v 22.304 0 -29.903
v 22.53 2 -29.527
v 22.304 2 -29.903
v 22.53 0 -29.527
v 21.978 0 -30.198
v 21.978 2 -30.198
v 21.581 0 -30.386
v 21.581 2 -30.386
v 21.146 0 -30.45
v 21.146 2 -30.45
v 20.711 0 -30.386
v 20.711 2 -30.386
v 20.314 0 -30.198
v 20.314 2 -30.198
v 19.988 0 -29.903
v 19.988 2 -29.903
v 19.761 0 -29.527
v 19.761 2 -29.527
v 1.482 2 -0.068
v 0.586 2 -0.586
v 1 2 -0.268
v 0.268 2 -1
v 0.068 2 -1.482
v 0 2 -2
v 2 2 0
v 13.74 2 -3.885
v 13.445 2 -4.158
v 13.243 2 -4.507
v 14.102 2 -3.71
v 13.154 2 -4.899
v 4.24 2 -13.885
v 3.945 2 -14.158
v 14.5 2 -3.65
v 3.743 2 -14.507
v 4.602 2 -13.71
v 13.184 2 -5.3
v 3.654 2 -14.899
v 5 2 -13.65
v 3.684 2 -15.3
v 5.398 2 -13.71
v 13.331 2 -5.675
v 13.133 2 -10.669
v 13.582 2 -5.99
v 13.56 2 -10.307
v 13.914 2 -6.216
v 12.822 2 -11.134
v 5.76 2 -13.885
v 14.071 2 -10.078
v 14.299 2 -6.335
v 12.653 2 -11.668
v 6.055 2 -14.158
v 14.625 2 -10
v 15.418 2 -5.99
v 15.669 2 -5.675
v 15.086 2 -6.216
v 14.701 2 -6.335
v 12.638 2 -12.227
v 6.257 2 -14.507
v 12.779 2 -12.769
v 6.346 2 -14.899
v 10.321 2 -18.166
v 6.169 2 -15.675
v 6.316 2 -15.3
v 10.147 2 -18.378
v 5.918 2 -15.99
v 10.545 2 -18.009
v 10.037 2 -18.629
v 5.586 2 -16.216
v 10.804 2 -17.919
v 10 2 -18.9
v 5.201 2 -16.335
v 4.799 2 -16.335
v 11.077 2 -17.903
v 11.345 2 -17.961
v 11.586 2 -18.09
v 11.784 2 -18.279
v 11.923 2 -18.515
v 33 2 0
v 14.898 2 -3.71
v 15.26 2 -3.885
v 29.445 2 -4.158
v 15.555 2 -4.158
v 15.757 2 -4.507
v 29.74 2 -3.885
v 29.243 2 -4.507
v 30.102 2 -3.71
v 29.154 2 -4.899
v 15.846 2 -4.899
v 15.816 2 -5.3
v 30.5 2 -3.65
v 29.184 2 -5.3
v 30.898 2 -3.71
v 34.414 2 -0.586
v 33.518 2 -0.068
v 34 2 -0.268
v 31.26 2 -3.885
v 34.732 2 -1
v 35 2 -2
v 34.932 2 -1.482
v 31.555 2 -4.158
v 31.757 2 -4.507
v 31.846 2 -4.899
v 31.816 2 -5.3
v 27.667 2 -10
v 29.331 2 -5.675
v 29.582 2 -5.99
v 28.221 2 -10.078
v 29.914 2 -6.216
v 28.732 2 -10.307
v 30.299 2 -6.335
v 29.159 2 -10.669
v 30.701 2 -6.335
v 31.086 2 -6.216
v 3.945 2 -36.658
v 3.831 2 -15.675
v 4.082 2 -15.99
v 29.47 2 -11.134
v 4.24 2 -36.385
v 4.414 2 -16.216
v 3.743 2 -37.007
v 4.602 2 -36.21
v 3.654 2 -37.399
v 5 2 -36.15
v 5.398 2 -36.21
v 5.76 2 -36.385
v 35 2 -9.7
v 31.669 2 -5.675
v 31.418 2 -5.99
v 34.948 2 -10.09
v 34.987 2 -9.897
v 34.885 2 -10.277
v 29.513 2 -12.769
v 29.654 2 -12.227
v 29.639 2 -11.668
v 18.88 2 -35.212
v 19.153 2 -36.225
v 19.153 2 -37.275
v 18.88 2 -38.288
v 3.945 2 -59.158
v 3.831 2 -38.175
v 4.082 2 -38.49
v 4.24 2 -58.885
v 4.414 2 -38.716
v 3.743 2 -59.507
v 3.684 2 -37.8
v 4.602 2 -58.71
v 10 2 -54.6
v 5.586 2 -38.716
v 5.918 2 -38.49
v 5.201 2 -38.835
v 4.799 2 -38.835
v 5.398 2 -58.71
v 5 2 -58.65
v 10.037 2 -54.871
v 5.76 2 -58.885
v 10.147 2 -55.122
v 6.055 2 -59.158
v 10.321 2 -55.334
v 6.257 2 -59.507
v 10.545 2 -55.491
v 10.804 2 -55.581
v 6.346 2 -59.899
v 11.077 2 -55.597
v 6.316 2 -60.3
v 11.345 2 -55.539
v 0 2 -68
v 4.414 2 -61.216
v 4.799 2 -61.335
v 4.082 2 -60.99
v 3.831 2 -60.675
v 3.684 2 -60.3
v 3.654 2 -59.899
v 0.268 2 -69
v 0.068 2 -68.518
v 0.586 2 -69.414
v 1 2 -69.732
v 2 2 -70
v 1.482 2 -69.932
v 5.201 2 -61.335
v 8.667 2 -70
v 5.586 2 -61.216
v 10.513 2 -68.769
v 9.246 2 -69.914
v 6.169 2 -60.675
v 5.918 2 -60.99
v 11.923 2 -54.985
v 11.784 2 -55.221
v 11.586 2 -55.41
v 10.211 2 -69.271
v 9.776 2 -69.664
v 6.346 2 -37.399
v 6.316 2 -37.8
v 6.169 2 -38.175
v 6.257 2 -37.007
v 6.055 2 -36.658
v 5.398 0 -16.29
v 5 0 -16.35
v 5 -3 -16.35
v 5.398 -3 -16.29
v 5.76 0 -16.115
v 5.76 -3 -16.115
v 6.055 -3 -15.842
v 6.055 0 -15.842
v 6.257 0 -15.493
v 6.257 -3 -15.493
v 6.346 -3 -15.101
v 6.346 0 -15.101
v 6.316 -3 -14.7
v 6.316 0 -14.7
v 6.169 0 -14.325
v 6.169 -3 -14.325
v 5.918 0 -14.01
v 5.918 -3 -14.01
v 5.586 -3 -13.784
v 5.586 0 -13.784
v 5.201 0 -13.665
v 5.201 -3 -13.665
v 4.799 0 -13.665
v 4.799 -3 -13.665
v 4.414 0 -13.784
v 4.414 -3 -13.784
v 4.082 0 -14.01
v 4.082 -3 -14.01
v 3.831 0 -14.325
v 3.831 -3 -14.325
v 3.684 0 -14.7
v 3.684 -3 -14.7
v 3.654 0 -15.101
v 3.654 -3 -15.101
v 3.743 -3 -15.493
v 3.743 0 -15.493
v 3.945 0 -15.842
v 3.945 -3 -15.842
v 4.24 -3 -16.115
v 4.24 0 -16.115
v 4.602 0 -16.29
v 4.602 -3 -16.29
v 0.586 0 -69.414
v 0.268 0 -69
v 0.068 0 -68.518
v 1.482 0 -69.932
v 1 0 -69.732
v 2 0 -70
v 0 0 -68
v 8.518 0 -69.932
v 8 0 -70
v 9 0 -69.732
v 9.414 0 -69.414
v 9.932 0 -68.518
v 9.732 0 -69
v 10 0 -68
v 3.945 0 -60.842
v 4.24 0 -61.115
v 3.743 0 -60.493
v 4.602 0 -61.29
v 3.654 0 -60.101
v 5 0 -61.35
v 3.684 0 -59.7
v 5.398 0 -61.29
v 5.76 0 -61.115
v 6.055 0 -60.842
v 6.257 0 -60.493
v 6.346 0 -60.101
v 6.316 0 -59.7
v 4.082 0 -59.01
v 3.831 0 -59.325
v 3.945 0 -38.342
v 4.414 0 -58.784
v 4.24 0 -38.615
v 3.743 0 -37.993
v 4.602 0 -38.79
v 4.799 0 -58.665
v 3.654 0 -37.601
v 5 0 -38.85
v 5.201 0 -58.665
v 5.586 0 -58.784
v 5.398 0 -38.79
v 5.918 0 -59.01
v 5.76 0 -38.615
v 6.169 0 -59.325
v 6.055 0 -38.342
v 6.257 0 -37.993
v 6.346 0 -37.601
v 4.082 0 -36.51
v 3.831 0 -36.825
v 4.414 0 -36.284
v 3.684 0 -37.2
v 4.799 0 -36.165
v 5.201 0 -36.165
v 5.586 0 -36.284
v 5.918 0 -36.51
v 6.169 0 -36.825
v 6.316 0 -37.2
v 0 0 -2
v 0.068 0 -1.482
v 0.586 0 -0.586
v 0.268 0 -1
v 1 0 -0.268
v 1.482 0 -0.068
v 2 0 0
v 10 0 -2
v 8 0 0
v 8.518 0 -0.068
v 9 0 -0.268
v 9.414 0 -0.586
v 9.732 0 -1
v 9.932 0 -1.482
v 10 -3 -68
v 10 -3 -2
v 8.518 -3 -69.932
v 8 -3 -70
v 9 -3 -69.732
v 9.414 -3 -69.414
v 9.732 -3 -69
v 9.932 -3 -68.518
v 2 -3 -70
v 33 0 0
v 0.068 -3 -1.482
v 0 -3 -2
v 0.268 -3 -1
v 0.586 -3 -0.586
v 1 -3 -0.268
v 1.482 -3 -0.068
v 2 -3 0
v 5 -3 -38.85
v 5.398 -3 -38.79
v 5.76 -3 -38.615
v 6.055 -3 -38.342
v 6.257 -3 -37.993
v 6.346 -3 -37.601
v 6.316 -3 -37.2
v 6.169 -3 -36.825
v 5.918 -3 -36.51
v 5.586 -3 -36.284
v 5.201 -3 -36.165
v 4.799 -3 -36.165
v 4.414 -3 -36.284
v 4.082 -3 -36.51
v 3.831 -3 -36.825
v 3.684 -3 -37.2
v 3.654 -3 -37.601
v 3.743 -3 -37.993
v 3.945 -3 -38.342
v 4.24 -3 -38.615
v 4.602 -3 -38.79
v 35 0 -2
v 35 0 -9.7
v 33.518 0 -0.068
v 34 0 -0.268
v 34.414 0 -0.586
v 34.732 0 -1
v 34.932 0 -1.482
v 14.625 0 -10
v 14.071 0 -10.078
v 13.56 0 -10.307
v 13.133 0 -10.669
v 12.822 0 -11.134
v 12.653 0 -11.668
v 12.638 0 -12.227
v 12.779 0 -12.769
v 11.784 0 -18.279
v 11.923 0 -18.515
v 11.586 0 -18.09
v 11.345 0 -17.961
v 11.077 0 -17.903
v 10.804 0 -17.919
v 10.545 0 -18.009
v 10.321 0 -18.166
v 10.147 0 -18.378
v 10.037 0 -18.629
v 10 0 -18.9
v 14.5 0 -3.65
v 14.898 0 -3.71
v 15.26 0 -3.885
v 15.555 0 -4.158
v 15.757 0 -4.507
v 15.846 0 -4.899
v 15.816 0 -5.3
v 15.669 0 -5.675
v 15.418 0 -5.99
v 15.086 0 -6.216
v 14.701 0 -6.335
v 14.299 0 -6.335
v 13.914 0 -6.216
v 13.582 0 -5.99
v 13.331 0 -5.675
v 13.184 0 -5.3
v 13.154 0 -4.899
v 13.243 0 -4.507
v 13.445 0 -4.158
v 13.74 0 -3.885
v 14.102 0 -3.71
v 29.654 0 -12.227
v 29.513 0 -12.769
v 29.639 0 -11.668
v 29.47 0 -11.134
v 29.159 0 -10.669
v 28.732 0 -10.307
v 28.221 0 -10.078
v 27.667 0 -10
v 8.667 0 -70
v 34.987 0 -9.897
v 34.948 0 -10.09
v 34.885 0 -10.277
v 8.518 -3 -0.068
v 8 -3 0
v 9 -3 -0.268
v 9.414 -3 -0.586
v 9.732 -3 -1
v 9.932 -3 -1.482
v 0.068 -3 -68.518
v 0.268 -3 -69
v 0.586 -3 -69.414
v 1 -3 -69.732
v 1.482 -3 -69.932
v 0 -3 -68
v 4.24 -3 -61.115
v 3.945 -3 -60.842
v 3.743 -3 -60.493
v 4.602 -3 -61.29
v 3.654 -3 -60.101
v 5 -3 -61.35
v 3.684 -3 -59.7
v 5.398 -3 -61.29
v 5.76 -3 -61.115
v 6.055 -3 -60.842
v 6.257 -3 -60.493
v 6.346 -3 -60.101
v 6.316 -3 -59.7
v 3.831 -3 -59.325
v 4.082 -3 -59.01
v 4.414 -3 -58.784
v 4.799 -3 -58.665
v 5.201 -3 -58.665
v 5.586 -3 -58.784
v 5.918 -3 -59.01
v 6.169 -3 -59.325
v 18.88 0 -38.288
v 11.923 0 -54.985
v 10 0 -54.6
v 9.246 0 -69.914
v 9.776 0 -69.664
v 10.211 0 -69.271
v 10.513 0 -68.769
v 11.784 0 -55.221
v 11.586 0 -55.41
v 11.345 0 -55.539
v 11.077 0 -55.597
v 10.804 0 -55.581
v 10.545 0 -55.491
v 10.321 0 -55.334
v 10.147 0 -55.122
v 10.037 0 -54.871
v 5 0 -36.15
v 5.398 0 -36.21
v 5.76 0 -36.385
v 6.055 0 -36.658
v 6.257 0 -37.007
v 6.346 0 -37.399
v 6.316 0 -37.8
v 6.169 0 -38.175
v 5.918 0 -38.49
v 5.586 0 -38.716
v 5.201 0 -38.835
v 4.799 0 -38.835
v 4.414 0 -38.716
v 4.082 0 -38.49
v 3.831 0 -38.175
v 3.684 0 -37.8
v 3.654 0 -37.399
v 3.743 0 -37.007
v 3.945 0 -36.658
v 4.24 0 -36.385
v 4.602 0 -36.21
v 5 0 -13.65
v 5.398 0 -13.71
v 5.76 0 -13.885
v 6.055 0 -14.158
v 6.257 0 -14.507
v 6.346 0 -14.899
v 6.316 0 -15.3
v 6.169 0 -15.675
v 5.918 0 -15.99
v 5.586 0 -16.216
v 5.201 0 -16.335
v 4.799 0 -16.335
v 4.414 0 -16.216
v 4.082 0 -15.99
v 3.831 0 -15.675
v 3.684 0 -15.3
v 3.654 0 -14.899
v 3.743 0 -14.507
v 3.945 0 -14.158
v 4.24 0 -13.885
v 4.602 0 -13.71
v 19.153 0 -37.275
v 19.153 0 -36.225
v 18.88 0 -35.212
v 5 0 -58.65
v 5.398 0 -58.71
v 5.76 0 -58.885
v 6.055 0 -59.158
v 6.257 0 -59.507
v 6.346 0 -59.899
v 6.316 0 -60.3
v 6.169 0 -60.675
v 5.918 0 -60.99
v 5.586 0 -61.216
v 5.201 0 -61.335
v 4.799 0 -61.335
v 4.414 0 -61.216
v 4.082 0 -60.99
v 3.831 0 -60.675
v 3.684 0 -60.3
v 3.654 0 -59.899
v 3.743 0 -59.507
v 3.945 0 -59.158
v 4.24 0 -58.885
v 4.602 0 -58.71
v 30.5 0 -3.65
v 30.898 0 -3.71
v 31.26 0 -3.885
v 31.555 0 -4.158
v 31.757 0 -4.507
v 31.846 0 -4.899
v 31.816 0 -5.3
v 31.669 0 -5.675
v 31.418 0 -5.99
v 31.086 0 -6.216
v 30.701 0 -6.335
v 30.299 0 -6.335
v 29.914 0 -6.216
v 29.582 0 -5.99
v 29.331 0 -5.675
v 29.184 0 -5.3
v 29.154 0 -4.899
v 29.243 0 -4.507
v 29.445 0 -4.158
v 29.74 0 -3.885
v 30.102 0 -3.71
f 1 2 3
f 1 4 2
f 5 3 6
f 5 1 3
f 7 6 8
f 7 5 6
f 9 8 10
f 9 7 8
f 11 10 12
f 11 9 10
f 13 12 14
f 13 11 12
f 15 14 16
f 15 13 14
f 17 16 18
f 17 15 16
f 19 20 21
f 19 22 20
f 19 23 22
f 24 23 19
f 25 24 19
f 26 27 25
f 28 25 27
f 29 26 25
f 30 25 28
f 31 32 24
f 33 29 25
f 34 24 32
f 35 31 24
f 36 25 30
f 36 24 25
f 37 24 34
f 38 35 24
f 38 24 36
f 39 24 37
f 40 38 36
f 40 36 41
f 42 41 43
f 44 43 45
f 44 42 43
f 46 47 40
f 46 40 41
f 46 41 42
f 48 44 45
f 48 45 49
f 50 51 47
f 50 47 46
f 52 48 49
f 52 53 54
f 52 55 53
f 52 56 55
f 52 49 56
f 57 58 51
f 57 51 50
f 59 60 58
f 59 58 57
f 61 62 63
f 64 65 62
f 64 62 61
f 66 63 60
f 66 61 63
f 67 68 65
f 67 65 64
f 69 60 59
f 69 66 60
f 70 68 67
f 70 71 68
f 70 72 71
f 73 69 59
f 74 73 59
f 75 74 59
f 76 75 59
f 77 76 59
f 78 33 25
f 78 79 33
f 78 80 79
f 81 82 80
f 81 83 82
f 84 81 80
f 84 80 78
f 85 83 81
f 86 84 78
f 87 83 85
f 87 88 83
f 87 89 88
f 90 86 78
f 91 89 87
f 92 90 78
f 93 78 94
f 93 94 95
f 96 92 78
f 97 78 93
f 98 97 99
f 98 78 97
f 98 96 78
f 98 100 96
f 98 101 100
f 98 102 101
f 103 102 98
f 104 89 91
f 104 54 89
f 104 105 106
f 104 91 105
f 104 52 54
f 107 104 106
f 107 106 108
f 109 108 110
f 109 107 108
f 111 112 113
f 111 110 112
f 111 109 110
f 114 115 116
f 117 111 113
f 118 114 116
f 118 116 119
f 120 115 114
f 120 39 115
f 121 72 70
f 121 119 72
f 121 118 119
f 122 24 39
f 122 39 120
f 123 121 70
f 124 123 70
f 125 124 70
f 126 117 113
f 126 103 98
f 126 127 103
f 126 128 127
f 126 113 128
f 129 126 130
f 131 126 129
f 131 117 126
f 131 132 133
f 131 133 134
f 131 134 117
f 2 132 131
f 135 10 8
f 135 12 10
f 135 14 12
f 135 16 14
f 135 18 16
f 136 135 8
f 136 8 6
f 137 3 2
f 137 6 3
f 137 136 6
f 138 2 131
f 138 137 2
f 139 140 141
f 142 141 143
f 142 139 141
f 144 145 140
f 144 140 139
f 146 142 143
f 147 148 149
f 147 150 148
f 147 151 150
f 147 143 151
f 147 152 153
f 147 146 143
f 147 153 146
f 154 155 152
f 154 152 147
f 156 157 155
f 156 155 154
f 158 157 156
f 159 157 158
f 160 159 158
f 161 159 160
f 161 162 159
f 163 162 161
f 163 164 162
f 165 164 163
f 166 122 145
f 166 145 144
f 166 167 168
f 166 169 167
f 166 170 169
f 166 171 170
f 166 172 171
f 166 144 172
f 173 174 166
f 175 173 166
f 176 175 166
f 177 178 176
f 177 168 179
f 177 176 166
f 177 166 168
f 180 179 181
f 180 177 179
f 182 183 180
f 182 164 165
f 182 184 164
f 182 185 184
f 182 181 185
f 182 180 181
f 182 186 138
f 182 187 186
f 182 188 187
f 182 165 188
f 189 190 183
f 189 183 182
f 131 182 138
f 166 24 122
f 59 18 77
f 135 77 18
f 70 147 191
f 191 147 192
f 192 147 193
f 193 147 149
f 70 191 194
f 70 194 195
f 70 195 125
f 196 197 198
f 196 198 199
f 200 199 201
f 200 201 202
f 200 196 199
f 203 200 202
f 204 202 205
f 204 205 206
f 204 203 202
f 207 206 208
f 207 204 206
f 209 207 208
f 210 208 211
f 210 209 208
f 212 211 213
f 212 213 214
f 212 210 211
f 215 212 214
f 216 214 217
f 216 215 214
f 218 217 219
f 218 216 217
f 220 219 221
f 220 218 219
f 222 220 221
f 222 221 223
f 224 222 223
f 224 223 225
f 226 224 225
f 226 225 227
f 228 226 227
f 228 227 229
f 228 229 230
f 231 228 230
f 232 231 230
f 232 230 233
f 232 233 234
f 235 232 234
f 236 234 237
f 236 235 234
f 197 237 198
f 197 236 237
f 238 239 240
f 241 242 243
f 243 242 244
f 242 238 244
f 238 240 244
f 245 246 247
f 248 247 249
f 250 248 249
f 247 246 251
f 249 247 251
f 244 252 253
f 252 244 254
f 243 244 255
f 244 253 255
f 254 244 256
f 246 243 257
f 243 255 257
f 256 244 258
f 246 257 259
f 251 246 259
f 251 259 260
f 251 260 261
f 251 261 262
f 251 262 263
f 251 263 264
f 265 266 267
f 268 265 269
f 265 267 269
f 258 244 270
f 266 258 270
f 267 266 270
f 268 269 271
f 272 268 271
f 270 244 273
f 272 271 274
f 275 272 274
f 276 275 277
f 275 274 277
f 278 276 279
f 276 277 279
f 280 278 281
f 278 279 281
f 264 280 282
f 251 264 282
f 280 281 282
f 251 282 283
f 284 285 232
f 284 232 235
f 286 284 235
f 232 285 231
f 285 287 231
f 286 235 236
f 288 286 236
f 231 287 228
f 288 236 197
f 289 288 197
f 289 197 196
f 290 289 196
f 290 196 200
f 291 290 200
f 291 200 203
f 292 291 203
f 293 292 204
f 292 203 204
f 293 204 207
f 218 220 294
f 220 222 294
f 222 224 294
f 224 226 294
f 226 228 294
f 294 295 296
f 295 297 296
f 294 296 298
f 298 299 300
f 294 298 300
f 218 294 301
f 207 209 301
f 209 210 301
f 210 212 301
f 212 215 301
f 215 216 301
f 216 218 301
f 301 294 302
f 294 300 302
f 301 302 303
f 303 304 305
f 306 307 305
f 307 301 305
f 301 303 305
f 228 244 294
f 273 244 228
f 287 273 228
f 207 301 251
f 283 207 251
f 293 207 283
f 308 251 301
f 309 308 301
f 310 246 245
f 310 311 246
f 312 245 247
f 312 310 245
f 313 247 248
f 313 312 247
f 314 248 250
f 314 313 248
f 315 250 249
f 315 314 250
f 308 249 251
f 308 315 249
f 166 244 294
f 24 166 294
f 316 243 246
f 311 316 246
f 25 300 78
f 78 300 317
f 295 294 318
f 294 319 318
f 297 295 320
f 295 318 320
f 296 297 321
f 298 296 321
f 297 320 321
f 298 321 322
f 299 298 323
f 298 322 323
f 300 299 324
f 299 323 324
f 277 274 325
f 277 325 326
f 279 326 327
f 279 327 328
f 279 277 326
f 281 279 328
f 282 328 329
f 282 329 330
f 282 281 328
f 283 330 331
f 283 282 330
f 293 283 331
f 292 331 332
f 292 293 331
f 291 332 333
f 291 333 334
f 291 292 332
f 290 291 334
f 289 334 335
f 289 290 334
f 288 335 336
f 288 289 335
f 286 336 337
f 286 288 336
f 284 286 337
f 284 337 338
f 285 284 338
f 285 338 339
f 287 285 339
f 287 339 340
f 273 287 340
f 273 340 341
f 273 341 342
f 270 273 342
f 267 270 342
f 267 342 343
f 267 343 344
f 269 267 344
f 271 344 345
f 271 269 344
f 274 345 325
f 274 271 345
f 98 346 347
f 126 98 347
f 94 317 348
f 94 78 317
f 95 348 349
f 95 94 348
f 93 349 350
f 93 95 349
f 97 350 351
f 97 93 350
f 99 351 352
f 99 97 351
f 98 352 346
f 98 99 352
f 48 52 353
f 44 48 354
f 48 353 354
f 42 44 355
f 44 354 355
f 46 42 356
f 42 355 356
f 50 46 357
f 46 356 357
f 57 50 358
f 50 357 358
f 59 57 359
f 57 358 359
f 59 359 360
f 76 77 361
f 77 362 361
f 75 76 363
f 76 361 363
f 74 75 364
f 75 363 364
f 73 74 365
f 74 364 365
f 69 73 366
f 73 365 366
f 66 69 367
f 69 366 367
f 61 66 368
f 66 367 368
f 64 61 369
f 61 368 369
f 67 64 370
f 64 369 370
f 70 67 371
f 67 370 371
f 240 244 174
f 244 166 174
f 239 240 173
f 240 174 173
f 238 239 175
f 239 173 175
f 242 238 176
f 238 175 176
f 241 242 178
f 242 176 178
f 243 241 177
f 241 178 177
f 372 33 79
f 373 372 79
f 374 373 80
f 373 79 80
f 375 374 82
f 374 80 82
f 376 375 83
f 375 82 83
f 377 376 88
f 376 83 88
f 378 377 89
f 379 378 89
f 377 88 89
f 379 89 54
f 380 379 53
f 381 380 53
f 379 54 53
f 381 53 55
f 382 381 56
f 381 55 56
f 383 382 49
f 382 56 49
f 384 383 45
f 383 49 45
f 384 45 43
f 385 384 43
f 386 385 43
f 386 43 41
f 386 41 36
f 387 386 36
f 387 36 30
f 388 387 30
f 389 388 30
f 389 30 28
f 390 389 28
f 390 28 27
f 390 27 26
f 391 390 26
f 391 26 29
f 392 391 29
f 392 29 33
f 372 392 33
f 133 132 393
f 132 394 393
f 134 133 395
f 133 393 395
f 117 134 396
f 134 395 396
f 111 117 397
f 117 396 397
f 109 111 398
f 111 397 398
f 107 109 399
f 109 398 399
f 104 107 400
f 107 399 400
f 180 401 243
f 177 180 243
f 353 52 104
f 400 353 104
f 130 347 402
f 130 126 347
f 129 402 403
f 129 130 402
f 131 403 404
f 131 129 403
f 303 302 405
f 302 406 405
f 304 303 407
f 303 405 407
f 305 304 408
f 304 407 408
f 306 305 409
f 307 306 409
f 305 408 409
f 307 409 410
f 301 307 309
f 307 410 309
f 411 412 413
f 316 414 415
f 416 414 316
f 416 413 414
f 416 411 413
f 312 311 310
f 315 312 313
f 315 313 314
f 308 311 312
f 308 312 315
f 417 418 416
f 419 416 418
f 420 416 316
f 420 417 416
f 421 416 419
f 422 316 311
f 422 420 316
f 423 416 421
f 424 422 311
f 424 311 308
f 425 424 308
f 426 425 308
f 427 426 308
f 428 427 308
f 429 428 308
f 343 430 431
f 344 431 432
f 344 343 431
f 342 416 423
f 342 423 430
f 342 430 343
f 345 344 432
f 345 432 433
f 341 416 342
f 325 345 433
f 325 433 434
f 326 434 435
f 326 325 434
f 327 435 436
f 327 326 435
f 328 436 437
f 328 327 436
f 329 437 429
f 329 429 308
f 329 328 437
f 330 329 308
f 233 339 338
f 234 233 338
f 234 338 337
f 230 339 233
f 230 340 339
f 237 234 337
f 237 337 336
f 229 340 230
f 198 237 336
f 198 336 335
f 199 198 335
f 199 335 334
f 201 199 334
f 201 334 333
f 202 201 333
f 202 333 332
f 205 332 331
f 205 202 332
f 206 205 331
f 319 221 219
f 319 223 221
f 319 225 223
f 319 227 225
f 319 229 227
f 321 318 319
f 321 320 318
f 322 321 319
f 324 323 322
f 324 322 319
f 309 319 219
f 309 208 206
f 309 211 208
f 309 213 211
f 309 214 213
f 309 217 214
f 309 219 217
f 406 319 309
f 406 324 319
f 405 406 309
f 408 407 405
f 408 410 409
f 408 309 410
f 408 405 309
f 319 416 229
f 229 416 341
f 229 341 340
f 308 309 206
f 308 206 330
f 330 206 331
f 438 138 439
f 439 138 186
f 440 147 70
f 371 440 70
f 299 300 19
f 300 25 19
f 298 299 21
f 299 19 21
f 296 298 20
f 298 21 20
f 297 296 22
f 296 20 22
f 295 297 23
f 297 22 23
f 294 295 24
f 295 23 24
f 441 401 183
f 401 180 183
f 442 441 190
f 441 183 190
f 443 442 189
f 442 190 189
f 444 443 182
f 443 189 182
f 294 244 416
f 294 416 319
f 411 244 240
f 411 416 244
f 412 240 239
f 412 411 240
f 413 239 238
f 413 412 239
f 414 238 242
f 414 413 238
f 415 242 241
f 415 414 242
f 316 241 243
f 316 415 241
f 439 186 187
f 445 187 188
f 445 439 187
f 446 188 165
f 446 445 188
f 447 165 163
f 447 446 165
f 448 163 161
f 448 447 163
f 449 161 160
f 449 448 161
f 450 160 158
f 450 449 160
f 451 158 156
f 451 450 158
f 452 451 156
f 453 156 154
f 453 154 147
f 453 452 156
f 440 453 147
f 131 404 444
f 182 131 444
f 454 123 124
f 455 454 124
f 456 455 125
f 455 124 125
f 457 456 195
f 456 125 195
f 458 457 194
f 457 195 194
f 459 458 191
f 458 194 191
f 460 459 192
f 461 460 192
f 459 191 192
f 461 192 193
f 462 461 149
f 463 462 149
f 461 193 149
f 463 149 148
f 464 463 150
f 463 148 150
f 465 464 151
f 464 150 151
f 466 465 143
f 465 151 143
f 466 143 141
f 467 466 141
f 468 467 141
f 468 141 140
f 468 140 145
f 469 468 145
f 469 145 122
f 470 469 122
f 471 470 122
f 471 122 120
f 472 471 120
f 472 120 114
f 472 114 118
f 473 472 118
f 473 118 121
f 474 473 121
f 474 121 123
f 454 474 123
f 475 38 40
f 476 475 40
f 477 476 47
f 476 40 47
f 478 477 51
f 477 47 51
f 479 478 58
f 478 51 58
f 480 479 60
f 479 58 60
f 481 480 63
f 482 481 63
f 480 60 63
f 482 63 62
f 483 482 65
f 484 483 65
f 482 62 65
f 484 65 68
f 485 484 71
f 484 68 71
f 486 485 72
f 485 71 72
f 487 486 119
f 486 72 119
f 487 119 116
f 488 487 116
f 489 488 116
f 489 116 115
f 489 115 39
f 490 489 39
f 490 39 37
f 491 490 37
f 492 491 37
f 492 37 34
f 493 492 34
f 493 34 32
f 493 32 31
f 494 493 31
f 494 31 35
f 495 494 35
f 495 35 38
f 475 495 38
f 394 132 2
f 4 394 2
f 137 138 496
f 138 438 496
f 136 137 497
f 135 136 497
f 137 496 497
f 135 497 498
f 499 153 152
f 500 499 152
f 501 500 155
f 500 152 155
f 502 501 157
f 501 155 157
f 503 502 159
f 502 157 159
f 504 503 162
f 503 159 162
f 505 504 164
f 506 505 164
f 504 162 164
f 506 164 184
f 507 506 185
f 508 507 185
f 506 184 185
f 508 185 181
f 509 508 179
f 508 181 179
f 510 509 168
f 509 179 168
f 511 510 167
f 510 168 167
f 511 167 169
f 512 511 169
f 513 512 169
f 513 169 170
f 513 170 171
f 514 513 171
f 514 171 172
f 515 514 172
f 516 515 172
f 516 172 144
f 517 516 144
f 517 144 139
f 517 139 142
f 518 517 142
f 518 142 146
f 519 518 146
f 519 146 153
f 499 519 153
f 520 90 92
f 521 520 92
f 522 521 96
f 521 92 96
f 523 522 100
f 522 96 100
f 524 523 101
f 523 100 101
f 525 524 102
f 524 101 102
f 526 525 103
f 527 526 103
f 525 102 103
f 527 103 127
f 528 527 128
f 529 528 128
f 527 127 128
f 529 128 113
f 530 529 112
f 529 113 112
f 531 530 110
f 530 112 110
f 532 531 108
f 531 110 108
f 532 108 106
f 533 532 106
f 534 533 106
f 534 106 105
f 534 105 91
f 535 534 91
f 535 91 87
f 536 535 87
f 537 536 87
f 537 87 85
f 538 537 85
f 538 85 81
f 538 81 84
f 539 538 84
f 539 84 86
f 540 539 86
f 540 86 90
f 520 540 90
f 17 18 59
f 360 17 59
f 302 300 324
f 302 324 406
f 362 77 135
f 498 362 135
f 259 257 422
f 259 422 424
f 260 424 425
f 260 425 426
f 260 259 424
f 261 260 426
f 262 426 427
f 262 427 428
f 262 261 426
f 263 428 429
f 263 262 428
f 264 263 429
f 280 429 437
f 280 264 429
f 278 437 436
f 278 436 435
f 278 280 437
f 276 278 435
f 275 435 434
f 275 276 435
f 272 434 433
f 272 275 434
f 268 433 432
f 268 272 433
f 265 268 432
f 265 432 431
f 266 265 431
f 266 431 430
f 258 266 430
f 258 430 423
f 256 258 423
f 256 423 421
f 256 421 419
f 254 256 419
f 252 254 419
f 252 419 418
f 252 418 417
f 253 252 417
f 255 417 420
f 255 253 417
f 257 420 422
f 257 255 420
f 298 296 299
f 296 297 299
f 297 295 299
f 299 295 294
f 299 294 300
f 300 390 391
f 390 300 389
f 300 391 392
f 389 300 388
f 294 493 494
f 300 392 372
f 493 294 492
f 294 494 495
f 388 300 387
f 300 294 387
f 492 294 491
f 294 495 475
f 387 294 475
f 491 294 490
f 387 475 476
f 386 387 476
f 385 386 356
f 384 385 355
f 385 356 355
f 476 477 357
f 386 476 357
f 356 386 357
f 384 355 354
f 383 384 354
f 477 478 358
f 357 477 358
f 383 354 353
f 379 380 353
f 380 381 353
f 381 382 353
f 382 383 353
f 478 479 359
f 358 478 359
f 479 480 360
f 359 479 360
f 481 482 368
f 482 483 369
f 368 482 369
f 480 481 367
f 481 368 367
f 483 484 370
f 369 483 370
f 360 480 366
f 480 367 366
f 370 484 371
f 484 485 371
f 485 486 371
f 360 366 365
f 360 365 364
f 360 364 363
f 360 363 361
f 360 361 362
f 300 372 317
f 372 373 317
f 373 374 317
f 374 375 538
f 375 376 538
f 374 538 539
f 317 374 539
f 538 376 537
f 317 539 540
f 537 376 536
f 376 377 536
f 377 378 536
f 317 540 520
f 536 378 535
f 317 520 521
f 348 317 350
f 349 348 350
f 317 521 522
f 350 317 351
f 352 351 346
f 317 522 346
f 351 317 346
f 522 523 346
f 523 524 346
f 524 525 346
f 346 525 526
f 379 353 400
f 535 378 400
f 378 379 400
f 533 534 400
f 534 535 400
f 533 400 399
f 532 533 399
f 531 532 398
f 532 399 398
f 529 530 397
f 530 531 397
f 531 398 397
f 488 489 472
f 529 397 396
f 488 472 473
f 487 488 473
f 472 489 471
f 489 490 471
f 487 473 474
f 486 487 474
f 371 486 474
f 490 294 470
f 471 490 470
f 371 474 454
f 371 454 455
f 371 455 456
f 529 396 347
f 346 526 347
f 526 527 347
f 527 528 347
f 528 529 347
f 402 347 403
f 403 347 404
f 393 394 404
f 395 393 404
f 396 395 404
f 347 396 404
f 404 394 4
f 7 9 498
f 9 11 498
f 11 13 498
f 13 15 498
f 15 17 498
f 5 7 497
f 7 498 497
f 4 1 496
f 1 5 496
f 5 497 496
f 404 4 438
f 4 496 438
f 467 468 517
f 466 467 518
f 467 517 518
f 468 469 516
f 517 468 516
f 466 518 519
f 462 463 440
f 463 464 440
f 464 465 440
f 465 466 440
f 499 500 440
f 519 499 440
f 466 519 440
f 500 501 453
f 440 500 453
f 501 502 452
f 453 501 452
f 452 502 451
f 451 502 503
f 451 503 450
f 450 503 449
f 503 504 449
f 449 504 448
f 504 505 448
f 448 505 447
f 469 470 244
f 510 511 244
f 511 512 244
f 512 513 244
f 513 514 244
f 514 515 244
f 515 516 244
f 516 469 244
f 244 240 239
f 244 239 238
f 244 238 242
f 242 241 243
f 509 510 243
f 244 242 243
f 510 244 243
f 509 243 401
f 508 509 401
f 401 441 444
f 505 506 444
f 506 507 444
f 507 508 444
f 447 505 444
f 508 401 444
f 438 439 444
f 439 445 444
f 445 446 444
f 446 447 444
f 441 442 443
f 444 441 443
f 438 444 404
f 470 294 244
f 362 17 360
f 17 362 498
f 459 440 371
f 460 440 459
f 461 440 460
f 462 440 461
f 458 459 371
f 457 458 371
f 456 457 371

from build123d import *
from OCP.BRepFilletAPI import BRepFilletAPI_MakeFillet

# Parameters (mm, degrees)
EXTRUDE_1_DEPTH     = 2
CUT_EXTRUDE_1_DEPTH = 3
SKETCH_3_R          = 1.35
CUT_EXTRUDE_2_DEPTH = 79.287930104
FILLET_1_R1         = 2
FILLET_1_R2         = 1
FILLET_1_R3         = 1.5
FILLET_1_R4         = 4
SKETCH_4_W          = 10
SKETCH_4_H          = 70
SKETCH_4_R          = 1.35
EXTRUDE_2_DEPTH     = 3
FILLET_2_R          = 2


with BuildPart() as part:
    # 草图1 → 凸台-拉伸1 (new body)
    with BuildSketch(Plane(origin=(0, 0, 0), x_dir=(1, 0, 0), z_dir=(0, 1, 0))):
        Polygon((0, 0), (35, 0), (35, 10), (10, 70), (0, 70), align=None)
    extrude(amount=EXTRUDE_1_DEPTH)

    # 草图2 → 切除-拉伸1 (cut)
    with BuildSketch(Plane(origin=(0, 2, 0), x_dir=(1, 0, 0), z_dir=(0, 1, 0))):
        Polygon((19.520833333, 36.75), (10, 59.6), (10, 13.9), align=None)
        Polygon((30.666666667, 10), (21.145833333, 32.85), (11.625, 10), align=None)
    extrude(amount=-CUT_EXTRUDE_1_DEPTH, mode=Mode.SUBTRACT)

    # 草图3 → 切除-拉伸2 (cut, through all)
    with BuildSketch(Plane(origin=(0, 2, 0), x_dir=(1, 0, 0), z_dir=(0, 1, 0))):
        with Locations((30.5, 5)):
            Circle(SKETCH_3_R)
        with Locations((14.5, 5)):
            Circle(SKETCH_3_R)
        with Locations((5, 15)):
            Circle(SKETCH_3_R)
        with Locations((5, 60)):
            Circle(SKETCH_3_R)
        with Locations((5, 37.5)):
            Circle(SKETCH_3_R)
    extrude(amount=-CUT_EXTRUDE_2_DEPTH, mode=Mode.SUBTRACT)

    # 圆角1: one fillet with a radius per group of edges: ONE call of the kernel's fillet builder (fillet() takes one radius for all edges)
    fillet_1_edges_1 = [part.edges().sort_by_distance(p)[0] for p in [
        (30.666666667, 1, -10),
        (0, 1, 0),
        (35, 1, 0),
        (10, 1, -70),
        (0, 1, -70),
        (11.625, 1, -10),
    ]]
    fillet_1_edges_2 = [part.edges().sort_by_distance(p)[0] for p in [
        (10, 1, -59.6),
        (10, 1, -13.9),
    ]]
    fillet_1_edges_3 = [part.edges().sort_by_distance(p)[0] for p in [
        (35, 1, -10),
        (21.145833333, 1, -32.85),
    ]]
    fillet_1_edges_4 = [part.edges().sort_by_distance(p)[0] for p in [
        (19.520833333, 1, -36.75),
    ]]
    fillet_1 = BRepFilletAPI_MakeFillet(part.part.solid().wrapped)
    for e in fillet_1_edges_1:
        fillet_1.Add(FILLET_1_R1, e.wrapped)
    for e in fillet_1_edges_2:
        fillet_1.Add(FILLET_1_R2, e.wrapped)
    for e in fillet_1_edges_3:
        fillet_1.Add(FILLET_1_R3, e.wrapped)
    for e in fillet_1_edges_4:
        fillet_1.Add(FILLET_1_R4, e.wrapped)
    add(Compound.cast(fillet_1.Shape()), mode=Mode.REPLACE)


with BuildPart() as body_2:
    # 草图4 → 凸台-拉伸2 (new body)
    with BuildSketch(Plane.XZ):
        with Locations((5, -35)):
            Rectangle(SKETCH_4_W, SKETCH_4_H)
        with Locations((5, -15)):
            Circle(SKETCH_4_R, mode=Mode.SUBTRACT)
        with Locations((5, -37.5)):
            Circle(SKETCH_4_R, mode=Mode.SUBTRACT)
        with Locations((5, -60)):
            Circle(SKETCH_4_R, mode=Mode.SUBTRACT)
    extrude(amount=EXTRUDE_2_DEPTH)

    # 圆角2
    fillet_2_edges = [body_2.edges().sort_by_distance(p)[0] for p in [
        (0, -1.5, -70),
        (0, -1.5, 0),
        (10, -1.5, 0),
        (10, -1.5, -70),
    ]]
    fillet(fillet_2_edges, radius=FILLET_2_R)


solid = Compound([part.part, body_2.part])
